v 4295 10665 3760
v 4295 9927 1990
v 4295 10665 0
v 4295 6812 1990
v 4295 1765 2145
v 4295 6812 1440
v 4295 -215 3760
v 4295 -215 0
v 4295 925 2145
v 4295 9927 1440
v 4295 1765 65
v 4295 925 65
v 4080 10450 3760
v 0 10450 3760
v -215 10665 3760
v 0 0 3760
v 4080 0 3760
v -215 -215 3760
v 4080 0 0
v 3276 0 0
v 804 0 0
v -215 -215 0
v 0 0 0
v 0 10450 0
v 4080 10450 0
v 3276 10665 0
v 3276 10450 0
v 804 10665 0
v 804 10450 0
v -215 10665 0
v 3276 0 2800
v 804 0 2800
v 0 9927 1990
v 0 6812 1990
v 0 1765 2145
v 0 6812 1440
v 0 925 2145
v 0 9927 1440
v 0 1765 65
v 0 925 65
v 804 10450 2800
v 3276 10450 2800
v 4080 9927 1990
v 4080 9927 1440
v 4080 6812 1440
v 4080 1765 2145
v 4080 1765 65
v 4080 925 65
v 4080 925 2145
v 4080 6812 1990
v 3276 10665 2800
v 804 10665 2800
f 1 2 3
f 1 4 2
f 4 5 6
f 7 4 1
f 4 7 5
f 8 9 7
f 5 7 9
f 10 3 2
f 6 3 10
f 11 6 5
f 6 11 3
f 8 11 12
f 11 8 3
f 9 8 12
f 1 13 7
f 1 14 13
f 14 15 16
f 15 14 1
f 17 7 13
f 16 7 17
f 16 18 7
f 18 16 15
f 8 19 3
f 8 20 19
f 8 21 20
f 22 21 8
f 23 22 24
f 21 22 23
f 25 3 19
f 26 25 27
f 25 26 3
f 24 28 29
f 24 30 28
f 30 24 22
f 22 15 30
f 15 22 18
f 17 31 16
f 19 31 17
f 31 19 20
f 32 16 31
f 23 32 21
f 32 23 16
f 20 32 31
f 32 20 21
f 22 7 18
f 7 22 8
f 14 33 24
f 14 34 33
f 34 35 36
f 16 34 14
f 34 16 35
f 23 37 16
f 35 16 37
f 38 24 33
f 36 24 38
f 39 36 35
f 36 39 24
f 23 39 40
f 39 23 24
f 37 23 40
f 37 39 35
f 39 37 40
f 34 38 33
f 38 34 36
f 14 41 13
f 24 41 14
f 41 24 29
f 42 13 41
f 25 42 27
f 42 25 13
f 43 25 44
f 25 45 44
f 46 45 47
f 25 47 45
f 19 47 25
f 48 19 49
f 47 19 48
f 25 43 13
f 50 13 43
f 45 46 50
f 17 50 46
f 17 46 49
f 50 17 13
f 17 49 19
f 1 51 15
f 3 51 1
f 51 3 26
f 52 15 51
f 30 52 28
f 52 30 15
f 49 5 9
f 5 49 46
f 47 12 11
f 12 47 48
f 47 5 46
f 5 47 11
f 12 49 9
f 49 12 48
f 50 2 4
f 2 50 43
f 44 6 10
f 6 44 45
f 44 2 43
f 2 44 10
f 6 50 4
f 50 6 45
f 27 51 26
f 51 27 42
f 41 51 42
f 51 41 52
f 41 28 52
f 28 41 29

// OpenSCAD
length = 10450;
width = 4080;
height = 3760;

wall_thickness = 215;

door_offset = 925;
door_width = 840;
door_height = 2080;
door_ground_offset = 65;

window_height = 550;
window_width = 3115;
window_offset = 523;
window_ground_offset = 1440;

barn_door_width = 2472;
barn_door_height = 2800;

barn_door_offset = (width / 2) - (barn_door_width / 2);

shed_width = 5100;

module structure() {
    difference() {
        union() {
            // shed end wall
            translate([-wall_thickness, -wall_thickness, 0])
                cube([width + wall_thickness * 2, wall_thickness, height]);
            // Mike's boundary side wall
            translate([-wall_thickness, -wall_thickness, 0])
                cube([wall_thickness, length + wall_thickness, height]);
            // field side wall
            translate([width, -wall_thickness, 0])
                cube([wall_thickness, length + wall_thickness, height]);
            // pat's end wall
            translate([-wall_thickness, length, 0])
                cube([width + wall_thickness * 2, wall_thickness, height]);
        }
        union() {
            // side door
            translate([0, door_offset, door_ground_offset])
                cube([width + wall_thickness, door_width, door_height]);
            
            // window
            translate([0, length - window_offset - window_width, window_ground_offset])
                cube([width + wall_thickness, window_width, window_height]);
            
            // barn doors
            translate([barn_door_offset, 0, 0])
                cube([barn_door_width, length + wall_thickness, barn_door_height]);
        }
    }
}

structure();
